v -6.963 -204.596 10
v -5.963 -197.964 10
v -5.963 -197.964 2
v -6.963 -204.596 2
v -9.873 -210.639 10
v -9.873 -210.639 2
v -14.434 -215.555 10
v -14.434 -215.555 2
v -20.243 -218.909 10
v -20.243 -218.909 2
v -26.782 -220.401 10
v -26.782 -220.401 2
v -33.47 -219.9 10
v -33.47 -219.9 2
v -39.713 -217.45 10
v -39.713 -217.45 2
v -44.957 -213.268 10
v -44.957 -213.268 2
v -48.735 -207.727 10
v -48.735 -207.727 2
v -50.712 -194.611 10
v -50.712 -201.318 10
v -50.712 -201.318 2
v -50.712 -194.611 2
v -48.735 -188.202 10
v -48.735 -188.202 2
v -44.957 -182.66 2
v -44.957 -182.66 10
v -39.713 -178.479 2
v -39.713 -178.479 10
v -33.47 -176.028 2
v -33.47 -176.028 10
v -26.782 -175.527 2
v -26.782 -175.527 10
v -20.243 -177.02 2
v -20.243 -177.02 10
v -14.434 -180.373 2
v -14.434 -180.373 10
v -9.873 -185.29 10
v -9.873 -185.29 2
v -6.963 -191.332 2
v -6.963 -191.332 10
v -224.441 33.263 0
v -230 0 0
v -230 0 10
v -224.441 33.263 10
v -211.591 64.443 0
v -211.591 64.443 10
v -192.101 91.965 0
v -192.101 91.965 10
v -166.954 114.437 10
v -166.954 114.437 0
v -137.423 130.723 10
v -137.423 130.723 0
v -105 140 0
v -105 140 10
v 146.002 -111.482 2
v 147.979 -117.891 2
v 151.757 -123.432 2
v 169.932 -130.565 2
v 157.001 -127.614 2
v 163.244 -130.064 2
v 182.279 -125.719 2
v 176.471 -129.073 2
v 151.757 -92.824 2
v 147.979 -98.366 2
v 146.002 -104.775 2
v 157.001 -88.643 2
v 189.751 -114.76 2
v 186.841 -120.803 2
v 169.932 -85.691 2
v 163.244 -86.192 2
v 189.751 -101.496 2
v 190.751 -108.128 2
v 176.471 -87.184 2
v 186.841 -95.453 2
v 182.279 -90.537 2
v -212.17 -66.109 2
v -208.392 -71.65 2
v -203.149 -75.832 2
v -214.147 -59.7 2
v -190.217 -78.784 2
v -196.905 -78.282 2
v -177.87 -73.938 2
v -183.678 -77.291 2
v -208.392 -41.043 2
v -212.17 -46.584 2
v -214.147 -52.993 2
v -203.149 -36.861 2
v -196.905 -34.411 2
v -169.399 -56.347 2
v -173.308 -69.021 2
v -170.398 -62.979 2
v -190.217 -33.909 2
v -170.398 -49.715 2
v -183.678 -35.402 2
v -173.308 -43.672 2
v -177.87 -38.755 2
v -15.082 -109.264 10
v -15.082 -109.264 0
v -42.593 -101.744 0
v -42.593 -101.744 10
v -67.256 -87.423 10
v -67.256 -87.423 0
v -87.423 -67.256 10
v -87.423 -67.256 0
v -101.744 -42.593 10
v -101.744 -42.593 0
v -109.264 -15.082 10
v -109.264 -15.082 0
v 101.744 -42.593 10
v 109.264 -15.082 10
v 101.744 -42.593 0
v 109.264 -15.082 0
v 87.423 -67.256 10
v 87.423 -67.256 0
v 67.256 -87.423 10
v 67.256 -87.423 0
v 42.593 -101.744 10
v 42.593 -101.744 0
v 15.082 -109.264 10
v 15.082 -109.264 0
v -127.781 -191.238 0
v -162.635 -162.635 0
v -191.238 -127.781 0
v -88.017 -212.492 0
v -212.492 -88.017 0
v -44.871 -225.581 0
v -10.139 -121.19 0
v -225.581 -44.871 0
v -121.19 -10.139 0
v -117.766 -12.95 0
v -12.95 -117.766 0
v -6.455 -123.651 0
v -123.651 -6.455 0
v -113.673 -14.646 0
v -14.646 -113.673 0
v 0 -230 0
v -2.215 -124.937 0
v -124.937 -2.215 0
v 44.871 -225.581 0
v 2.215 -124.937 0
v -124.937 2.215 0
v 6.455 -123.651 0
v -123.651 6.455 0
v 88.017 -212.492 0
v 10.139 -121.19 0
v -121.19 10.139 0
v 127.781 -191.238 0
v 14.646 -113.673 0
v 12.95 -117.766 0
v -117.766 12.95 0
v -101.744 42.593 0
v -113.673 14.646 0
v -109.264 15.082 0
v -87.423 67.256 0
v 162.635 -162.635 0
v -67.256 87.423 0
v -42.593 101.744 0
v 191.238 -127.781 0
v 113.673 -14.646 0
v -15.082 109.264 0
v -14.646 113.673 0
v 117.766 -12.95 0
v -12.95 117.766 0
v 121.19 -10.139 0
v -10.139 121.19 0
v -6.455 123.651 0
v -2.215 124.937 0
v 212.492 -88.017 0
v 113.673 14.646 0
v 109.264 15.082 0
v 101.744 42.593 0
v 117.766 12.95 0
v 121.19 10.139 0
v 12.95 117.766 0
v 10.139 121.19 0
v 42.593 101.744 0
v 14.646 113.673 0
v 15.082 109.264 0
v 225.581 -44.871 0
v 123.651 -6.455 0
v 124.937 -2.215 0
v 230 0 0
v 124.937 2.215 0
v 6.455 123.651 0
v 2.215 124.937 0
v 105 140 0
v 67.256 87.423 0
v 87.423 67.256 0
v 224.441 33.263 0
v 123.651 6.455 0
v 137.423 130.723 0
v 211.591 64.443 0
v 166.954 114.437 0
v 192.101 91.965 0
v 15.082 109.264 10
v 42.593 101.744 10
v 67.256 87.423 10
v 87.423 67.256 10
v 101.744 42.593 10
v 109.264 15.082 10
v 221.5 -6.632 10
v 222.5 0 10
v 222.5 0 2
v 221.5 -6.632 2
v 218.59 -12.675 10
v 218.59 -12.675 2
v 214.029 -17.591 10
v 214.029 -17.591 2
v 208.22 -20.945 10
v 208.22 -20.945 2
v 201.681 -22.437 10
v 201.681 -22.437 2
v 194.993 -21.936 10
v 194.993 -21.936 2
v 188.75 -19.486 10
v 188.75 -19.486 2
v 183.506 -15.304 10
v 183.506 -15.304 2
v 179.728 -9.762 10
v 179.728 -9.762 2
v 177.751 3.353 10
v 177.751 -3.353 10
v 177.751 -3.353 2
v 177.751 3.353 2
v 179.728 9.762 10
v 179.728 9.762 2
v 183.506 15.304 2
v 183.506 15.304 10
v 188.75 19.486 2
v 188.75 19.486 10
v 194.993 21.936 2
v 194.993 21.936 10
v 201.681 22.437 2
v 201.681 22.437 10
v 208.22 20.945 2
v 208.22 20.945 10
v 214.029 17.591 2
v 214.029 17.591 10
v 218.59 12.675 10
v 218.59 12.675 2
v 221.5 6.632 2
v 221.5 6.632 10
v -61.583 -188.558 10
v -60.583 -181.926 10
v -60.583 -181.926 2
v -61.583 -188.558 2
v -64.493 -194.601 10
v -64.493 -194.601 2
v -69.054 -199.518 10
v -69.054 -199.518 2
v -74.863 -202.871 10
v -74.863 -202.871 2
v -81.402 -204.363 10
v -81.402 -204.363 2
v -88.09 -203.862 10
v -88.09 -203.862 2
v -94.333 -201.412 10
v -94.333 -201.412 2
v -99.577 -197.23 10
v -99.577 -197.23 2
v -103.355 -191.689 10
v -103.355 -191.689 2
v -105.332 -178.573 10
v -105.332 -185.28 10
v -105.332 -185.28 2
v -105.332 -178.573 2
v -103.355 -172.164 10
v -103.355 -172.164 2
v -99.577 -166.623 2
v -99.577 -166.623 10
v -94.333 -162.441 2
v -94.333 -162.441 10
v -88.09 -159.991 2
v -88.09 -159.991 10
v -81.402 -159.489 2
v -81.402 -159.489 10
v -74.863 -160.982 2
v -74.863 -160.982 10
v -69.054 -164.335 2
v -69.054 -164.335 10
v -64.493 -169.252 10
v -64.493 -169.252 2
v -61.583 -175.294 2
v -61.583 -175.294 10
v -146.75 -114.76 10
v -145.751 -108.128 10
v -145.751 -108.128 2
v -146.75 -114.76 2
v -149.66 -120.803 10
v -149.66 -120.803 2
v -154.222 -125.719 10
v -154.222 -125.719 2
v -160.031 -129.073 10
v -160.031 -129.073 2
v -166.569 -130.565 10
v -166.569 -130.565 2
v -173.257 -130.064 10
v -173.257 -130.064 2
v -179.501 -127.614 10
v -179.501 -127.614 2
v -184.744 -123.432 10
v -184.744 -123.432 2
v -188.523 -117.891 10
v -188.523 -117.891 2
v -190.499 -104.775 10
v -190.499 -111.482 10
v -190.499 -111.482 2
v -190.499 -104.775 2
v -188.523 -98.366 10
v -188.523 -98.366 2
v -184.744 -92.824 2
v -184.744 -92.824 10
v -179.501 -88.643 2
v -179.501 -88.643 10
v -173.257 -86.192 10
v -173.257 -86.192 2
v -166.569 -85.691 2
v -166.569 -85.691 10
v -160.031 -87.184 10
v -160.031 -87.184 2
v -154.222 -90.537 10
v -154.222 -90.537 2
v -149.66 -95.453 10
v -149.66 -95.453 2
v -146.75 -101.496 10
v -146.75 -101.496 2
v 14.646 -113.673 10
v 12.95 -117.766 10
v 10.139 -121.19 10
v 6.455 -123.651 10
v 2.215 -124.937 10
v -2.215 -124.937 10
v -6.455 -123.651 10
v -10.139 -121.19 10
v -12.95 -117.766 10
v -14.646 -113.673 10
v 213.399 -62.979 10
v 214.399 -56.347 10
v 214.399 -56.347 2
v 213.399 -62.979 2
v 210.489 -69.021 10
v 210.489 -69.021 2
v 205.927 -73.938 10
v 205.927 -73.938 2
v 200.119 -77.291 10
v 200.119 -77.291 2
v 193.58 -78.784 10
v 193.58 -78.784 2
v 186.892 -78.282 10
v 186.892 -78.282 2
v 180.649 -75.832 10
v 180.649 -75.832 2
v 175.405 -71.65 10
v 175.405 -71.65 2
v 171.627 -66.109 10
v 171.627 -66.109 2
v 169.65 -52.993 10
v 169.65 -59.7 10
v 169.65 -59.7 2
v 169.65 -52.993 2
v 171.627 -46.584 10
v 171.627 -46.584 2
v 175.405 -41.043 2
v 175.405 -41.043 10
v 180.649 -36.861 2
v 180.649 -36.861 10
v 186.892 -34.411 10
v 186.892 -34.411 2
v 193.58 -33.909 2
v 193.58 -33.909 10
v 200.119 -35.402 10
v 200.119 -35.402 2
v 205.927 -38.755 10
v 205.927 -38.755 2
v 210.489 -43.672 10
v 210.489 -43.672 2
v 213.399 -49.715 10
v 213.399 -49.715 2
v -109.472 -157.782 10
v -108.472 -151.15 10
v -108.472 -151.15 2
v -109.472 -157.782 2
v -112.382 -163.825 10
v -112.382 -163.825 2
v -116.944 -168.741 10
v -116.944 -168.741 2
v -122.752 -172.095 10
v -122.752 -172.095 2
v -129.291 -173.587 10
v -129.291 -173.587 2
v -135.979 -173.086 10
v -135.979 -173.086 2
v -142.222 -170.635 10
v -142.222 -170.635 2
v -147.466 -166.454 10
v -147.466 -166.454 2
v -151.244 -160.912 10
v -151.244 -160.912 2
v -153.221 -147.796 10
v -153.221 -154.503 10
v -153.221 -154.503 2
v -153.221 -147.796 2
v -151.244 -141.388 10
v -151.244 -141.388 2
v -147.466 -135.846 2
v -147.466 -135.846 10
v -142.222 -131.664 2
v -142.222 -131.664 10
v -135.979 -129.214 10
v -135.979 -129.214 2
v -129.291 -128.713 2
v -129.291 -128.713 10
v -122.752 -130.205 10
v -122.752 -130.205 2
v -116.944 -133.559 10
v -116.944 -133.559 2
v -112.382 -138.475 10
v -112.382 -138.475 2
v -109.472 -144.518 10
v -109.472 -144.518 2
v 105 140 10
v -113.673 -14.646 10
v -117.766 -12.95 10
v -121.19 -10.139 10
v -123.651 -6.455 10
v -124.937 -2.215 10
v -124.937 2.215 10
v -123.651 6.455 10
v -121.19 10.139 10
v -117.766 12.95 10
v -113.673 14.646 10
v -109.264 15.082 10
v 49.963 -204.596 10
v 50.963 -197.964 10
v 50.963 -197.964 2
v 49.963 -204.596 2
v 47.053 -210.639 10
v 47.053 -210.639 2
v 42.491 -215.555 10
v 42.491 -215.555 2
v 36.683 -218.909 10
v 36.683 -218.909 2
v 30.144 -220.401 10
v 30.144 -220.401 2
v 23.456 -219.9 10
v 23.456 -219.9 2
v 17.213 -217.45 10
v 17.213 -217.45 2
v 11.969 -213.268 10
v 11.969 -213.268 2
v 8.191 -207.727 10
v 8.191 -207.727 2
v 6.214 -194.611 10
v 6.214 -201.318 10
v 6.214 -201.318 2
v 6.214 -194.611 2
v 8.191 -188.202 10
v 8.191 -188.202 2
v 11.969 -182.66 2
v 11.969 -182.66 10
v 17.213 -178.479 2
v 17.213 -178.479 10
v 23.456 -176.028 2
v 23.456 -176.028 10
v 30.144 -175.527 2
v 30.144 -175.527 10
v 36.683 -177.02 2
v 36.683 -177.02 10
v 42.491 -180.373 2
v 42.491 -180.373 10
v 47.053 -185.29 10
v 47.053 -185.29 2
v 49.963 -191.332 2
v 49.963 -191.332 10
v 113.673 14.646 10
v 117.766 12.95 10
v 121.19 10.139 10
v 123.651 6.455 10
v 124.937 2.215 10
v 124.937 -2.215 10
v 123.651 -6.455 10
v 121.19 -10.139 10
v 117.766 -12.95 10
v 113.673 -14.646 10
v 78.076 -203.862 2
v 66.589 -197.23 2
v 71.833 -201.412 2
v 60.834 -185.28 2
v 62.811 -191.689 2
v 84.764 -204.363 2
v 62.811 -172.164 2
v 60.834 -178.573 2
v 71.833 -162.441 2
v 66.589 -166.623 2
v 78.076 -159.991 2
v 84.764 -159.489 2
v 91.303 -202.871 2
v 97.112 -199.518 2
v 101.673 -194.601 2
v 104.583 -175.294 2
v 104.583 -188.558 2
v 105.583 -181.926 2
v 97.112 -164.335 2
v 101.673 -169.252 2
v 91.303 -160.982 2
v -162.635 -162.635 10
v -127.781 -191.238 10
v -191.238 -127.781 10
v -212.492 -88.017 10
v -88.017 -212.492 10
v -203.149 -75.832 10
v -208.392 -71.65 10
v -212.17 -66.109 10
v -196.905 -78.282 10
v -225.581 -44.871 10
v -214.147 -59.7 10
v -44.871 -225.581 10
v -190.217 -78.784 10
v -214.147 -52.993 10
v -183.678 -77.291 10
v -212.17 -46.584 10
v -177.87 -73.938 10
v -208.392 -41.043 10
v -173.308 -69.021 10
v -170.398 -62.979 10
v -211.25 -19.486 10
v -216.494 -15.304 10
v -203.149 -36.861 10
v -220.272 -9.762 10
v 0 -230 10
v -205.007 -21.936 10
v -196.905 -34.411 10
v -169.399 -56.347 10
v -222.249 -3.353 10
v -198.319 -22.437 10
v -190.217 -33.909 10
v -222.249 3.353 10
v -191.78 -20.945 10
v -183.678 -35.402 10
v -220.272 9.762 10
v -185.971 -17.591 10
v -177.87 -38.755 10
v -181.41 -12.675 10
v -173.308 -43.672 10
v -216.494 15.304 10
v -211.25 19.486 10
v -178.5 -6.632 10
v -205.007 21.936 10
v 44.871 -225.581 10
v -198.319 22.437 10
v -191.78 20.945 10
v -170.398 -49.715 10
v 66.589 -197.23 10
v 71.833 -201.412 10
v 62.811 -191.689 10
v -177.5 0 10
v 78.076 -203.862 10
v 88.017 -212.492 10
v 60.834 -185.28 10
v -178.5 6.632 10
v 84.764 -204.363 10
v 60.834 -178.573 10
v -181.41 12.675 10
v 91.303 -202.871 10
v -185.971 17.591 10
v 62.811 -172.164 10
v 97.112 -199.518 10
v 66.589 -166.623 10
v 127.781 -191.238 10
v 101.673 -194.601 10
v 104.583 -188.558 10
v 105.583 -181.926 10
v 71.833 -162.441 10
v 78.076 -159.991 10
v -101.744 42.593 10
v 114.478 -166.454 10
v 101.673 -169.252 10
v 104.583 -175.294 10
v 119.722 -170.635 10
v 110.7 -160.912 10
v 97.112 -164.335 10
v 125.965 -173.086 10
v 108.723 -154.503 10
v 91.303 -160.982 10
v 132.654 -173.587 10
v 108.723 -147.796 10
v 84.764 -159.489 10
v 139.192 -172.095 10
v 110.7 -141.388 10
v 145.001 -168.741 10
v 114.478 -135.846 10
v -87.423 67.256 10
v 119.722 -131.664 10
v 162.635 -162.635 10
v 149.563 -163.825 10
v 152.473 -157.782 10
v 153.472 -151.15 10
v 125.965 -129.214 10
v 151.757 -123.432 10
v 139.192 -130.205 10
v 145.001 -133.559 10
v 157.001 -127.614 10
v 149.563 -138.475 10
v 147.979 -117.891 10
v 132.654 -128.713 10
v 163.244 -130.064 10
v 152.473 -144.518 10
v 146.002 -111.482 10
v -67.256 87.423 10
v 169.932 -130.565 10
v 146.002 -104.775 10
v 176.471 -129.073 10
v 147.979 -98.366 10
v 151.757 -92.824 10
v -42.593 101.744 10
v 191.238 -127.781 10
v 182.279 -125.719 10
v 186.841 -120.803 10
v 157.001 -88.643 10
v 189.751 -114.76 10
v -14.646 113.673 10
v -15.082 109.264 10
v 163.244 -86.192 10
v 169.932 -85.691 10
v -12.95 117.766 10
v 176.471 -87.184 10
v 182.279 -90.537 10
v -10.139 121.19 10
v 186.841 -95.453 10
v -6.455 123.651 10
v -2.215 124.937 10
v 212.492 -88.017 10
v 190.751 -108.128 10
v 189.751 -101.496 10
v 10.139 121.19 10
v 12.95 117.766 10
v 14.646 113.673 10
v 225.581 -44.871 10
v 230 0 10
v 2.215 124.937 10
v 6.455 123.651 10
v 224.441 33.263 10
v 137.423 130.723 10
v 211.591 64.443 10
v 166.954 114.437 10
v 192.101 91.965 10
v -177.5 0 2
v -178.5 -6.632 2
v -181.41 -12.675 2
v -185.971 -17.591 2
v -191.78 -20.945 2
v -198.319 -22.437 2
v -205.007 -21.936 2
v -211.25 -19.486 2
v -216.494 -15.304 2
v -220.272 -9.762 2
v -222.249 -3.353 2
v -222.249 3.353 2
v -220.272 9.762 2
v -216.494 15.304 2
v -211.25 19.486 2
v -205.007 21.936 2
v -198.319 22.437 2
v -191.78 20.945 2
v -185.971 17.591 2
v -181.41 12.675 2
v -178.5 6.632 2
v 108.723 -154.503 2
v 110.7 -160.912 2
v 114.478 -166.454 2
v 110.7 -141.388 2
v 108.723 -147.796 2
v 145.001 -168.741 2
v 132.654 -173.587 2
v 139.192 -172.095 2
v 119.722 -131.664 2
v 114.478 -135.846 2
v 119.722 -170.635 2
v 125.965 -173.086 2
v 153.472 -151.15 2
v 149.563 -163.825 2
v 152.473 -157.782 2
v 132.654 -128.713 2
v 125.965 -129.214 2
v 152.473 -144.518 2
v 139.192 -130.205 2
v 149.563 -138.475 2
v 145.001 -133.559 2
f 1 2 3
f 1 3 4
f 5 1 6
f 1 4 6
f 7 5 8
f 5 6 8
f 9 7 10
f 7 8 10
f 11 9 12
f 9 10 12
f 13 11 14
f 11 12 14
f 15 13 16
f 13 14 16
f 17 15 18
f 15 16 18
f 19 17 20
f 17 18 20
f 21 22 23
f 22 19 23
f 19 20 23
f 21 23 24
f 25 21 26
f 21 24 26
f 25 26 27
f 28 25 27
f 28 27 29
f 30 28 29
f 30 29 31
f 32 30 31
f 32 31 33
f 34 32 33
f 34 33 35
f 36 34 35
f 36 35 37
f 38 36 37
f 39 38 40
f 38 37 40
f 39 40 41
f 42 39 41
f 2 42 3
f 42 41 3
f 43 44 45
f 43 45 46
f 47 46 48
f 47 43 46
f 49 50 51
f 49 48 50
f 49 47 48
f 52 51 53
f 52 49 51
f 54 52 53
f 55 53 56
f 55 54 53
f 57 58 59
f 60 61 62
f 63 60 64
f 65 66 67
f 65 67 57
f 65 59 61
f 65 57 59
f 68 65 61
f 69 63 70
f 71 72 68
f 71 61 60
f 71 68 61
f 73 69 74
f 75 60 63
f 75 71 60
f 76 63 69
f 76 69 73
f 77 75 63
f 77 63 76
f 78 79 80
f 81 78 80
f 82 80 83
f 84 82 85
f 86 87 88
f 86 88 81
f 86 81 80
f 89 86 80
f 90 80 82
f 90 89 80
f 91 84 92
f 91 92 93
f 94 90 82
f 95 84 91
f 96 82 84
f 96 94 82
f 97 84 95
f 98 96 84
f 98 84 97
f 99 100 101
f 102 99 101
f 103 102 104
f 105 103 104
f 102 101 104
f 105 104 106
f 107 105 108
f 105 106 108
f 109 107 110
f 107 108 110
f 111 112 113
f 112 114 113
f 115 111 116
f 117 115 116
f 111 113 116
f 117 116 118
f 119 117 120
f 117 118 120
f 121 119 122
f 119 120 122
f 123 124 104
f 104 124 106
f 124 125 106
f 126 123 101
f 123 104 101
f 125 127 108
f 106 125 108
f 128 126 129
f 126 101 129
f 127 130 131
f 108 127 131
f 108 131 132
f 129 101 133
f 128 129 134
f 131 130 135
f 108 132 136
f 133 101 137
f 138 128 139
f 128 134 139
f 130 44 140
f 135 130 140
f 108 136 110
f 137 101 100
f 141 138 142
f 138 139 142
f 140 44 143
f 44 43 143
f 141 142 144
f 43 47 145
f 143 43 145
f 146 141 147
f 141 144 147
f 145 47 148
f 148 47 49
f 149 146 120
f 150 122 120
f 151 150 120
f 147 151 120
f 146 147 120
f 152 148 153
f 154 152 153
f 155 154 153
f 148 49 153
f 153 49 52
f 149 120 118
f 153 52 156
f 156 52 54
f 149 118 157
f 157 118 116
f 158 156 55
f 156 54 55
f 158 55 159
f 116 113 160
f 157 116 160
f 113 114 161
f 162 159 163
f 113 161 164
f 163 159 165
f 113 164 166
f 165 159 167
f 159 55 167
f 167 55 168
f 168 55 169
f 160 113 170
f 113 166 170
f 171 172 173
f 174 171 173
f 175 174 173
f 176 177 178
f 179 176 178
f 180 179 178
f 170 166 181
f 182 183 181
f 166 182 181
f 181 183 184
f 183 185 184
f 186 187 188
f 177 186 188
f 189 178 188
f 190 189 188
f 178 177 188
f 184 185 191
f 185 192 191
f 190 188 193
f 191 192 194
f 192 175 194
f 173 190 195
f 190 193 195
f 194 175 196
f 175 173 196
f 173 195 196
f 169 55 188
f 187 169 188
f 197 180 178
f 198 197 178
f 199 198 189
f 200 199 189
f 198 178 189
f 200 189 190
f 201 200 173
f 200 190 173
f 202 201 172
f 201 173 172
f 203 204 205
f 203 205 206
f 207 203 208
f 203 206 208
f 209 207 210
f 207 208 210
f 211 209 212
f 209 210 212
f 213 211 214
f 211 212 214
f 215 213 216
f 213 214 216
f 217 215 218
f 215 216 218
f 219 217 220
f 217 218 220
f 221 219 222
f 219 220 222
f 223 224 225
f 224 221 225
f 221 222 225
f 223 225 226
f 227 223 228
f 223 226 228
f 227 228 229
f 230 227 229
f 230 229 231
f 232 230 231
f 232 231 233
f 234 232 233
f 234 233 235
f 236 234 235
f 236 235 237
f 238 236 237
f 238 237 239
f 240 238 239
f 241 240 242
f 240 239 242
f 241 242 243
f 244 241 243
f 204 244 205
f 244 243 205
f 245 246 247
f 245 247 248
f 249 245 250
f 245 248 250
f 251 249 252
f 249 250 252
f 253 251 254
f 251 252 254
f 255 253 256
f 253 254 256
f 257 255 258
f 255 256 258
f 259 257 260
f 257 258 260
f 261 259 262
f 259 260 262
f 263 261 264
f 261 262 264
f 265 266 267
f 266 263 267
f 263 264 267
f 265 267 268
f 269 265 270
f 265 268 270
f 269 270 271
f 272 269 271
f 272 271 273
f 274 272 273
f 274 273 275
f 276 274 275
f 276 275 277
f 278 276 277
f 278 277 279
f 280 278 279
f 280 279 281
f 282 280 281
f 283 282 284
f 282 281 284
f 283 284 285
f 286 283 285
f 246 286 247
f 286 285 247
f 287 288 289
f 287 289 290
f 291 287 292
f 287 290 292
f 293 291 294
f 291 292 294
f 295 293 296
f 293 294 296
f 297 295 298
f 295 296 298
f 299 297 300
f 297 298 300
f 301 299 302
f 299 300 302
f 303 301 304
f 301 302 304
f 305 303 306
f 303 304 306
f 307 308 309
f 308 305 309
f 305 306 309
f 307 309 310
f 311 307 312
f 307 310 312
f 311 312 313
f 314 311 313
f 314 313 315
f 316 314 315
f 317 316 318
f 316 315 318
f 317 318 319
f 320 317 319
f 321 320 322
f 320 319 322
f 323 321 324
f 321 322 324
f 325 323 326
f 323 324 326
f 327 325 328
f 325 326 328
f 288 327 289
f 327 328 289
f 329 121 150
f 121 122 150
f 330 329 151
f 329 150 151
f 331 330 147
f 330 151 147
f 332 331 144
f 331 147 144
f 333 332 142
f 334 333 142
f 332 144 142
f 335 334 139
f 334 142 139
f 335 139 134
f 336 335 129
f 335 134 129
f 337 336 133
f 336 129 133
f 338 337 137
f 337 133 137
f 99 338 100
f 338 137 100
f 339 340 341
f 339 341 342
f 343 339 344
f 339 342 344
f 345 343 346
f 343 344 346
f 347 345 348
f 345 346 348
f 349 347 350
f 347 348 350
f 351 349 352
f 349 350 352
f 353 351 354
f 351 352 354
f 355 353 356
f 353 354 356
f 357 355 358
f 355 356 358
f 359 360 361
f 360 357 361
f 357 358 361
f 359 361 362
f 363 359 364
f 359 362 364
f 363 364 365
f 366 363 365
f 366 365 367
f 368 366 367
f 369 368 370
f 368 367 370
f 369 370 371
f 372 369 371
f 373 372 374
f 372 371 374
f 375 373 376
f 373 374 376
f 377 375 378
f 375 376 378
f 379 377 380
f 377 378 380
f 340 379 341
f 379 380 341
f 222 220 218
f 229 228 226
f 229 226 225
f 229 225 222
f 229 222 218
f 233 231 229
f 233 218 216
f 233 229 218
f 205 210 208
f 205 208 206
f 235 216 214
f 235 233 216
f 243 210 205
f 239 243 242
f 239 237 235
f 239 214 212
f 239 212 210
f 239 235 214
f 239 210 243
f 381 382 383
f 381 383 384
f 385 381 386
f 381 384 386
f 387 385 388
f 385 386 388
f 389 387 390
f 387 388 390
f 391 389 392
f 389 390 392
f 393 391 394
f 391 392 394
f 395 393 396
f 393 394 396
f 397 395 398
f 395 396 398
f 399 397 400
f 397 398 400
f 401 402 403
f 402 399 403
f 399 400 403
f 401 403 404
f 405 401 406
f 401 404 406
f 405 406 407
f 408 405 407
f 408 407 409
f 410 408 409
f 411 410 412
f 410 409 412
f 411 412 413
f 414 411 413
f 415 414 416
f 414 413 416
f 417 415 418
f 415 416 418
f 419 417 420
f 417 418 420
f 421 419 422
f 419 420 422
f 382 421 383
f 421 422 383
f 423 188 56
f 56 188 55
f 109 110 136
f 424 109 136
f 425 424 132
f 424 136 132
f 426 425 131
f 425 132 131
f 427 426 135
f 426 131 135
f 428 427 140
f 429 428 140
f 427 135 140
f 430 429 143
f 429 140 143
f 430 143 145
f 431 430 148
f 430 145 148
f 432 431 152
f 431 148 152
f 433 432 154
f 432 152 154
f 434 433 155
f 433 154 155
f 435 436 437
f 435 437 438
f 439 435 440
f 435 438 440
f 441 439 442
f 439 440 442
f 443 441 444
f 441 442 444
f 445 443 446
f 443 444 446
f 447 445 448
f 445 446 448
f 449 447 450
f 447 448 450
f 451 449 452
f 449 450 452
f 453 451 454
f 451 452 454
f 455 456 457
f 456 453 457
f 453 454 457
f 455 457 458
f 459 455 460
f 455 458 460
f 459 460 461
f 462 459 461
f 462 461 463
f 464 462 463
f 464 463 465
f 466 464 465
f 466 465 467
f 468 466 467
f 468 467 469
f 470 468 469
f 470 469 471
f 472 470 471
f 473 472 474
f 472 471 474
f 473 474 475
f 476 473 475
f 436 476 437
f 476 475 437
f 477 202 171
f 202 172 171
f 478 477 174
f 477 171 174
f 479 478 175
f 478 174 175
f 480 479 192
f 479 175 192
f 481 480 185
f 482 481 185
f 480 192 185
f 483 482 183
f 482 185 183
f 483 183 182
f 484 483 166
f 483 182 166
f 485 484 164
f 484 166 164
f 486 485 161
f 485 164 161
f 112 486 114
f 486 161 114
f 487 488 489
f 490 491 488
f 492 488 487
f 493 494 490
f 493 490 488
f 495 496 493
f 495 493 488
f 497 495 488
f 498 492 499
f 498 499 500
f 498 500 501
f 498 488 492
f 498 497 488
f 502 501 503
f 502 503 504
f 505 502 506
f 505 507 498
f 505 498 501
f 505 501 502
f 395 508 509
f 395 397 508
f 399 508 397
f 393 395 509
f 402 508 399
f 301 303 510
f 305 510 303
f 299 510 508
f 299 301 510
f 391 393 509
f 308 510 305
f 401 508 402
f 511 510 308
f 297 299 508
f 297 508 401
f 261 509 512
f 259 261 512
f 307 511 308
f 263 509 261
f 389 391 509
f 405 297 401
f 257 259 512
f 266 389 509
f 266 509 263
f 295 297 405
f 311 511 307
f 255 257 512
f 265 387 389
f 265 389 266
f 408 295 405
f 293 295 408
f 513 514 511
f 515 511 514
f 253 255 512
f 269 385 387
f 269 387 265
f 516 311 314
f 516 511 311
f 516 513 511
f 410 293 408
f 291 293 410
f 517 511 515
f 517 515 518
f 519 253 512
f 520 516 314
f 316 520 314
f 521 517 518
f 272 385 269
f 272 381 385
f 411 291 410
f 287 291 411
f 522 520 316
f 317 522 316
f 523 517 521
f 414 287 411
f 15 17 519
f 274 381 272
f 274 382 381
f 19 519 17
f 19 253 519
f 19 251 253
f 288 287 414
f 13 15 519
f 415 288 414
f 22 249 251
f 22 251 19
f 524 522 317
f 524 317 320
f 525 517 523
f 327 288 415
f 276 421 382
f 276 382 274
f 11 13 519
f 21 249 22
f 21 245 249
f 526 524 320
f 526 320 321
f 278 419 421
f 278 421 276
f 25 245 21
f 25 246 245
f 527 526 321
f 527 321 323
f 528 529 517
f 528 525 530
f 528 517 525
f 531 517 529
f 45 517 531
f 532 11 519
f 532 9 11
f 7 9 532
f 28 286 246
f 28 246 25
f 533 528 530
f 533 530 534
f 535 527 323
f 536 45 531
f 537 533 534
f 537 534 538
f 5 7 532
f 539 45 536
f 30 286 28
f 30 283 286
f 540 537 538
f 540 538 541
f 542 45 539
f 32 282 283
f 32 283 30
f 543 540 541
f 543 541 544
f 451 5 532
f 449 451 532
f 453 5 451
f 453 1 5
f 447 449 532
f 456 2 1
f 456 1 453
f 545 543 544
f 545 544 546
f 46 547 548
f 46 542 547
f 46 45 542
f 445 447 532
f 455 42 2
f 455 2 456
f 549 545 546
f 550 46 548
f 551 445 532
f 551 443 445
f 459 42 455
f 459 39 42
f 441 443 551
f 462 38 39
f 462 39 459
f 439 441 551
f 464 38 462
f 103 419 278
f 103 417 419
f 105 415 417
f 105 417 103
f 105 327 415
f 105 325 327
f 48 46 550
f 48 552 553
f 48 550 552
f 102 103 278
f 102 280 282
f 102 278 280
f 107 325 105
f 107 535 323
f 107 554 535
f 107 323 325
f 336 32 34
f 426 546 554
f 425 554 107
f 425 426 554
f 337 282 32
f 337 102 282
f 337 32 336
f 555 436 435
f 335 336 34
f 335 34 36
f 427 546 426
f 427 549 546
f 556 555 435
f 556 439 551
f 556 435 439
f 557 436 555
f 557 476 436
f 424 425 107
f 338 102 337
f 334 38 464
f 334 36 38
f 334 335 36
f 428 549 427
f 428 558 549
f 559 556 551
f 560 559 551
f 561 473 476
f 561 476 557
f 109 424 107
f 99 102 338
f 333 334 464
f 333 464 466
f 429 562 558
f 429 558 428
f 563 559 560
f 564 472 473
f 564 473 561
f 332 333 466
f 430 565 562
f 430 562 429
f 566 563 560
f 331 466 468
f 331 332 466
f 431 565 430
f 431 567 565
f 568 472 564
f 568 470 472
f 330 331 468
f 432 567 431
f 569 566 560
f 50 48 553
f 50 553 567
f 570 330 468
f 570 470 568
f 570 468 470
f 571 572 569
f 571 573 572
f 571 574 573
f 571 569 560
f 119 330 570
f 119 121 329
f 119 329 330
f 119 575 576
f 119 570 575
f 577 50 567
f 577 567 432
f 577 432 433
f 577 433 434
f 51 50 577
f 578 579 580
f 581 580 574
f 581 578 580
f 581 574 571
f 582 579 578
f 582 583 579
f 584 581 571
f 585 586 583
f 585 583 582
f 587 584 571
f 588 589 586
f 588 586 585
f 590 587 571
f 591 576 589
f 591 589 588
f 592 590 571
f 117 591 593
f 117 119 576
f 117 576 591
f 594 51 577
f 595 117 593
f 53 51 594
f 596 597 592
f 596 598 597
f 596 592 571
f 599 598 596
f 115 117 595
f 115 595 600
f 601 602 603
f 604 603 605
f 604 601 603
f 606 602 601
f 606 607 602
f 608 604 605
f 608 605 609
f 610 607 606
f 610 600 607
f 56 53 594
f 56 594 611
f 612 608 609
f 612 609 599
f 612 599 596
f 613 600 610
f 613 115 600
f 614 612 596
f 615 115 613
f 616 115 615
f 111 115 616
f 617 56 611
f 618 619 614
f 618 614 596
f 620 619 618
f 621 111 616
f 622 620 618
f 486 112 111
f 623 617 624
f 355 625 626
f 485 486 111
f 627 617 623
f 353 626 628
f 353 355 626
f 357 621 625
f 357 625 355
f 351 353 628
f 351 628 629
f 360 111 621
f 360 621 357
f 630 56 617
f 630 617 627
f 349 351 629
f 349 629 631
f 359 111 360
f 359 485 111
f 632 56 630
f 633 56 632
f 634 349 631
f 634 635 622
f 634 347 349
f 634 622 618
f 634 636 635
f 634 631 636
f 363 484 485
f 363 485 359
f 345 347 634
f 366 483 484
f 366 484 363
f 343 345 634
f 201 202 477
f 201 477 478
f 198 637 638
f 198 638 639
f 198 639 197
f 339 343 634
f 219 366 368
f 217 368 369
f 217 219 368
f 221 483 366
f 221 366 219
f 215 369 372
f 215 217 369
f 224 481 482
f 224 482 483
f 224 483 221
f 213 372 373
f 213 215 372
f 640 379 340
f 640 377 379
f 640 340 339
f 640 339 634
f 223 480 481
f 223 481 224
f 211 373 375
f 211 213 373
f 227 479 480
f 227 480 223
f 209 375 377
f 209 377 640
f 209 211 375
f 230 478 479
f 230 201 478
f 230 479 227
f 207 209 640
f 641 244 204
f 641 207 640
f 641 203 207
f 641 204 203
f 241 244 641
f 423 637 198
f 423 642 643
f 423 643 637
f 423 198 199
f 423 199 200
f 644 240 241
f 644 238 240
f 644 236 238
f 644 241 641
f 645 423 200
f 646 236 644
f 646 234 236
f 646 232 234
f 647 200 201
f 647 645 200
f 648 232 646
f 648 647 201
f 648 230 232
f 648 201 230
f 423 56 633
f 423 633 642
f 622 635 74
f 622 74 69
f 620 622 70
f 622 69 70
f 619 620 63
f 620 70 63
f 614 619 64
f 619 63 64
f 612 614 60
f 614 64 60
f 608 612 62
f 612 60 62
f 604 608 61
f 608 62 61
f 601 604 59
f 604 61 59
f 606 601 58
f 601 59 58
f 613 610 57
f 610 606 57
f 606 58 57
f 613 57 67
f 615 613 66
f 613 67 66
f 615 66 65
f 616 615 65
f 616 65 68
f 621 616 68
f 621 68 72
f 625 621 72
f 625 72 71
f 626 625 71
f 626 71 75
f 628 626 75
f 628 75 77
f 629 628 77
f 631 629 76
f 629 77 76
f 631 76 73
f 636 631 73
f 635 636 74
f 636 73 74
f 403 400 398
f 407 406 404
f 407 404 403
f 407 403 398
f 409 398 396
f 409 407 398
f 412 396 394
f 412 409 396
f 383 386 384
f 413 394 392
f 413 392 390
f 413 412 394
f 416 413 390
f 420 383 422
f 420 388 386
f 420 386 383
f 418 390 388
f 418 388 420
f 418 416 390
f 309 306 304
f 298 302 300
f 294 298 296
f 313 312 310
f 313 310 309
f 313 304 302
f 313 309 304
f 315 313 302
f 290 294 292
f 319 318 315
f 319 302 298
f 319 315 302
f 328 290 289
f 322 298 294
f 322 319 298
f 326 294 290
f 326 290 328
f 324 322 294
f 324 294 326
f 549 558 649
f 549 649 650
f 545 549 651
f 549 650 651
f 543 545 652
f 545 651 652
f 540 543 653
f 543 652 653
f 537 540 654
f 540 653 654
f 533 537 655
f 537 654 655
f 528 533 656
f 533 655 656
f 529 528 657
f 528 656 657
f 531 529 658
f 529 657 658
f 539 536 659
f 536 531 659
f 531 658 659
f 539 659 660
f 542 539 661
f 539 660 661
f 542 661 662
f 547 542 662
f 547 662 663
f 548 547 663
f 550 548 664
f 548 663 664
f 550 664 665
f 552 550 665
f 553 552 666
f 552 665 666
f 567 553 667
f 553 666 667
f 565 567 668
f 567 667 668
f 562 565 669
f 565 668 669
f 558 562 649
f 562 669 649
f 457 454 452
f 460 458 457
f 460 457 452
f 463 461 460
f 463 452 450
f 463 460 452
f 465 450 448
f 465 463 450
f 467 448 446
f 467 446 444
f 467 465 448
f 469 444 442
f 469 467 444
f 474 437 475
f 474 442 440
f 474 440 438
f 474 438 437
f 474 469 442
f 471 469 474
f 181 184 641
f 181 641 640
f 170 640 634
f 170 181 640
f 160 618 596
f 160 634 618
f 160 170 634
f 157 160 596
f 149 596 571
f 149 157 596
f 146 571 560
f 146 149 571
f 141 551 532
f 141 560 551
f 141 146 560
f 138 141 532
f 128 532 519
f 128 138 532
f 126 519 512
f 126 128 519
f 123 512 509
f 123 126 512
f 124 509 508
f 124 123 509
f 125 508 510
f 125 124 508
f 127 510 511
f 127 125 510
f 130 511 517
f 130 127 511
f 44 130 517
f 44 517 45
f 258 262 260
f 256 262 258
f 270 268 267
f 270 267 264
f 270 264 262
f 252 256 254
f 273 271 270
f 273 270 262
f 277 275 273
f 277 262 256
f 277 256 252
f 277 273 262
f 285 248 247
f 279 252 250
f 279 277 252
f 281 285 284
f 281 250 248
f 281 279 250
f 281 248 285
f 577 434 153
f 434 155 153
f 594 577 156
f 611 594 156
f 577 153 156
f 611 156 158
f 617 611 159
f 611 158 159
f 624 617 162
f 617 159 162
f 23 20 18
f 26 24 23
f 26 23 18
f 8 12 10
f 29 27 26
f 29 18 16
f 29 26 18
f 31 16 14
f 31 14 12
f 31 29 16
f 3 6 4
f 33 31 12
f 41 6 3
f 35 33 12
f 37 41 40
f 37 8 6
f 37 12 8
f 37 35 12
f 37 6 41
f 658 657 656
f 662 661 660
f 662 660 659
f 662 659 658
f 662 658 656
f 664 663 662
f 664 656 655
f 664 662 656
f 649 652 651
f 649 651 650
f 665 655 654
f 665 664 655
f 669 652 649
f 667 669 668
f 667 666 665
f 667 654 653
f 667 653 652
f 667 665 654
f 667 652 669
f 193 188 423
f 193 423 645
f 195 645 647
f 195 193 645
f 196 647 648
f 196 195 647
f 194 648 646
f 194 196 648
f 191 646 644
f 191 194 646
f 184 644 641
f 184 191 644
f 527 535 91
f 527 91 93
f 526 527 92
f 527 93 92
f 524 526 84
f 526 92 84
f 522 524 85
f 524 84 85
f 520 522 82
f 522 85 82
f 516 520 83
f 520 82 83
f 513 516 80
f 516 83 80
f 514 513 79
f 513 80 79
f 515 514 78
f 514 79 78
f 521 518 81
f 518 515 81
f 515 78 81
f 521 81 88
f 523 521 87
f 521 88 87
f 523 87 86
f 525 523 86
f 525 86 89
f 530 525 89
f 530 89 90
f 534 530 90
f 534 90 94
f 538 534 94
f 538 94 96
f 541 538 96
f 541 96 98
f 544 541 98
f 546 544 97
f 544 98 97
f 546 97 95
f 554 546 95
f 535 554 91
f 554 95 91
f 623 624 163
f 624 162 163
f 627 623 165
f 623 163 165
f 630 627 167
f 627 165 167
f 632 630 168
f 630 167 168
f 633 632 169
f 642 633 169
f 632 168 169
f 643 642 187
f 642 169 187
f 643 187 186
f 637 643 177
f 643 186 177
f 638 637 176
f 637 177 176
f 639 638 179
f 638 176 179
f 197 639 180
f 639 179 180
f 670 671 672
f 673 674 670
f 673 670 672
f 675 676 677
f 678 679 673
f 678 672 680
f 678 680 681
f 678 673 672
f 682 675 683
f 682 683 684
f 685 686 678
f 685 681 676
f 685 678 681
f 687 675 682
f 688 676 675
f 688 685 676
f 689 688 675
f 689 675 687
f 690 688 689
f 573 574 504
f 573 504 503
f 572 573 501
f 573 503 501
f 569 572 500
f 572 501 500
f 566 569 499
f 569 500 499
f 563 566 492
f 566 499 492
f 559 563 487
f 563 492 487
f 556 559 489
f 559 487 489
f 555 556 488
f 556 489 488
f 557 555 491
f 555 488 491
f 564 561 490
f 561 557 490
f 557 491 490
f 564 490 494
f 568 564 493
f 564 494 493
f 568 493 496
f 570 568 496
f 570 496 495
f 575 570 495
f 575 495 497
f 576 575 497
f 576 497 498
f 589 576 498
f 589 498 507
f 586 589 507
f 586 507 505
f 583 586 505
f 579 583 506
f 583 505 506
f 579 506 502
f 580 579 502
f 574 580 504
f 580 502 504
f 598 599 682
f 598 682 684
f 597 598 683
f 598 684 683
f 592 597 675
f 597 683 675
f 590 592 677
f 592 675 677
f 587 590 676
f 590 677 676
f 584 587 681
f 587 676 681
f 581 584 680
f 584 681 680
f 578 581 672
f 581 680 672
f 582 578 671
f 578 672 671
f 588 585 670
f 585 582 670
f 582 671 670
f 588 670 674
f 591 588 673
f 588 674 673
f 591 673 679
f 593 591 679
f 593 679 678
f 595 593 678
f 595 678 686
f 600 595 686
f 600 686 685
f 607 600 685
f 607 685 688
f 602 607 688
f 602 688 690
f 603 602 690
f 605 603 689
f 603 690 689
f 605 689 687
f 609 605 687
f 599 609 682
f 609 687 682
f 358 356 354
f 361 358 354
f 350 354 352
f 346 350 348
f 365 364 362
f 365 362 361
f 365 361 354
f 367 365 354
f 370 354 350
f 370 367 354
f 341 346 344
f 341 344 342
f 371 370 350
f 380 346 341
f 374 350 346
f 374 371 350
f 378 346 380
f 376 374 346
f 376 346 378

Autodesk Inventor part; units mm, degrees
ref_plane "YZ Plane" through (0, 0, 0) normal (1, 0, 0) x (0, 1, 0)
ref_plane "XZ Plane" through (0, 0, 0) normal (0, 1, 0) x (-1, 0, 0)
ref_plane "XY Plane" through (0, 0, 0) normal (0, 0, 1) x (1, 0, 0)
sketch "Sketch1" plane through (0, 0, 0) normal (0, 0, 1) x (1, 0, 0)
  line L0 (0, 0) -> (-200, 0) construction
  circle A0 centre (-200, 0) radius 17.5
  circle A1 centre (-200, 0) radius 22.5
  line L1 (0, 0) -> (-191.898595, -56.346511) construction
  circle A2 centre (-191.898595, -56.346511) radius 17.5
  circle A3 centre (-191.898595, -56.346511) radius 22.5
  line L2 (0, 0) -> (-168.250707, -108.128163) construction
  circle A4 centre (-168.250707, -108.128163) radius 17.5
  circle A5 centre (-168.250707, -108.128163) radius 22.5
  line L3 (0, 0) -> (-130.972147, -151.149915) construction
  circle A6 centre (-130.972147, -151.149915) radius 17.5
  circle A7 centre (-130.972147, -151.149915) radius 22.5
  line L4 (0, 0) -> (-83.083003, -181.926399) construction
  circle A8 centre (-83.083003, -181.926399) radius 17.5
  circle A9 centre (-83.083003, -181.926399) radius 22.5
  line L5 (0, 0) -> (-28.462968, -197.964288) construction
  circle A10 centre (-28.462968, -197.964288) radius 17.5
  circle A11 centre (-28.462968, -197.964288) radius 22.5
  line L6 (0, 0) -> (28.462968, -197.964288) construction
  circle A12 centre (28.462968, -197.964288) radius 17.5
  circle A13 centre (28.462968, -197.964288) radius 22.5
  line L7 (0, 0) -> (83.083003, -181.926399) construction
  circle A14 centre (83.083003, -181.926399) radius 17.5
  circle A15 centre (83.083003, -181.926399) radius 22.5
  line L8 (0, 0) -> (130.972147, -151.149915) construction
  circle A16 centre (130.972147, -151.149915) radius 17.5
  circle A17 centre (130.972147, -151.149915) radius 22.5
  line L9 (0, 0) -> (168.250707, -108.128163) construction
  circle A18 centre (168.250707, -108.128163) radius 17.5
  circle A19 centre (168.250707, -108.128163) radius 22.5
  line L10 (0, 0) -> (191.898595, -56.346511) construction
  circle A20 centre (191.898595, -56.346511) radius 17.5
  circle A21 centre (191.898595, -56.346511) radius 22.5
  line L11 (0, 0) -> (200, 0) construction
  circle A22 centre (200, 0) radius 17.5
  circle A23 centre (200, 0) radius 22.5
  circle A24 centre (-200, 0) radius 0 construction
  circle A25 centre (200, 0) radius 0 construction
  arc A26 (-200, 0) -> (-200, 0) centre (-200, 0) ccw
  arc A27 (200, 0) -> (200, 0) centre (200, 0) ccw
  line L12 (0, 0) -> (-200, 0) construction
  circle A28 centre (0, 0) radius 110.3
  circle A29 centre (-110, 0) radius 15.1
  arc A30 (-230, 0) -> (230, 0) centre (0, 0) ccw
  line L13 (0, 0) -> (0, 140)
  line L14 (0, 140) -> (-105, 140)
  line L15 (0, 140) -> (105, 140)
  arc A31 (230, 0) -> (105, 140) centre (80.210153, -7.937363) ccw
  arc A32 (-105, 140) -> (-230, 0) centre (-80.210153, -7.937363) ccw
  circle A33 centre (0, -110) radius 15.1
  circle A34 centre (110, 0) radius 15.1
  circle A35 centre (0, 110) radius 15.1
  point P0 (-166.666667, 74.535599)
  point P1 (-109.264, -15.082052)
  point P2 (-109.264, 15.082052)
  point P3 (15.082052, 109.264)
  point P4 (109.264, 15.082052)
  point P5 (109.264, -15.082052)
  point P6 (15.082052, -109.264)
  point P7 (-15.082052, -109.264)
  point P8 (-15.082052, 109.264)
  dimension "d1" = 35
  dimension "d2" = 45
  dimension "d5" = 180
  dimension "d35" = 200
  dimension "d36" = 220.6
  dimension "d43" = 30.2
  dimension "d48" = 230
  dimension "d49" = 140
  dimension "d53" = 105
  dimension "d54" = 150
  dimension "d55" = 150
  dimension "d56" = 210
  dimension "d58" = 110
  dimension "d61" = 360
sketch "Sketch1 outline for Extrusion1" plane through (0, 0, 0) normal (0, 0, 1) x (1, 0, 0)
  line L0 (0, 140) -> (-105, 140)
  line L1 (105, 140) -> (0, 140)
  arc A0 (-105, 140) -> (-230, 0) centre (-80.210153, -7.937363) ccw
  arc A1 (230, 0) -> (105, 140) centre (80.210153, -7.937363) ccw
  arc A2 (-230, 0) -> (230, 0) centre (0, 0) ccw
  circle A3 centre (-130.972147, -151.149915) radius 22.5
  circle A4 centre (-83.083003, -181.926399) radius 22.5
  circle A5 centre (-28.462968, -197.964288) radius 22.5
  circle A6 centre (-168.250707, -108.128163) radius 22.5
  circle A7 centre (-191.898595, -56.346511) radius 22.5
  circle A8 centre (28.462968, -197.964288) radius 22.5
  circle A9 centre (83.083003, -181.926399) radius 22.5
  circle A10 centre (130.972147, -151.149915) radius 22.5
  circle A11 centre (168.250707, -108.128163) radius 22.5
  circle A12 centre (191.898595, -56.346511) radius 22.5
  circle A13 centre (-200, 0) radius 22.5
  arc A14 (-15.082052, 109.264) -> (15.082052, 109.264) centre (0, 110) cw
  arc A15 (-109.264, 15.082052) -> (-15.082052, 109.264) centre (0, 0) cw
  arc A16 (-109.264, -15.082052) -> (-109.264, 15.082052) centre (-110, 0) cw
  arc A17 (-15.082052, -109.264) -> (-109.264, -15.082052) centre (0, 0) cw
  arc A18 (15.082052, -109.264) -> (-15.082052, -109.264) centre (0, -110) cw
  arc A19 (109.264, -15.082052) -> (15.082052, -109.264) centre (0, 0) cw
  arc A20 (109.264, 15.082052) -> (109.264, -15.082052) centre (110, 0) cw
  arc A21 (15.082052, 109.264) -> (109.264, 15.082052) centre (0, 0) cw
  circle A22 centre (200, 0) radius 22.5
extrude "Extrusion1" add sketch "Sketch1 outline for Extrusion1" along normal blind 10
sketch "Sketch1 outline for Extrusion2" plane through (0, 0, 0) normal (0, 0, 1) x (1, 0, 0)
  circle A0 centre (-200, 0) radius 22.5
  circle A1 centre (-191.898595, -56.346511) radius 22.5
  circle A2 centre (-168.250707, -108.128163) radius 22.5
  circle A3 centre (-130.972147, -151.149915) radius 22.5
  circle A4 centre (-83.083003, -181.926399) radius 22.5
  circle A5 centre (-28.462968, -197.964288) radius 22.5
  circle A6 centre (28.462968, -197.964288) radius 22.5
  circle A7 centre (83.083003, -181.926399) radius 22.5
  circle A8 centre (130.972147, -151.149915) radius 22.5
  circle A9 centre (168.250707, -108.128163) radius 22.5
  circle A10 centre (191.898595, -56.346511) radius 22.5
  circle A11 centre (200, 0) radius 22.5
extrude "Extrusion2" add sketch "Sketch1 outline for Extrusion2" along normal blind 2
properties part number "BasePlate"
